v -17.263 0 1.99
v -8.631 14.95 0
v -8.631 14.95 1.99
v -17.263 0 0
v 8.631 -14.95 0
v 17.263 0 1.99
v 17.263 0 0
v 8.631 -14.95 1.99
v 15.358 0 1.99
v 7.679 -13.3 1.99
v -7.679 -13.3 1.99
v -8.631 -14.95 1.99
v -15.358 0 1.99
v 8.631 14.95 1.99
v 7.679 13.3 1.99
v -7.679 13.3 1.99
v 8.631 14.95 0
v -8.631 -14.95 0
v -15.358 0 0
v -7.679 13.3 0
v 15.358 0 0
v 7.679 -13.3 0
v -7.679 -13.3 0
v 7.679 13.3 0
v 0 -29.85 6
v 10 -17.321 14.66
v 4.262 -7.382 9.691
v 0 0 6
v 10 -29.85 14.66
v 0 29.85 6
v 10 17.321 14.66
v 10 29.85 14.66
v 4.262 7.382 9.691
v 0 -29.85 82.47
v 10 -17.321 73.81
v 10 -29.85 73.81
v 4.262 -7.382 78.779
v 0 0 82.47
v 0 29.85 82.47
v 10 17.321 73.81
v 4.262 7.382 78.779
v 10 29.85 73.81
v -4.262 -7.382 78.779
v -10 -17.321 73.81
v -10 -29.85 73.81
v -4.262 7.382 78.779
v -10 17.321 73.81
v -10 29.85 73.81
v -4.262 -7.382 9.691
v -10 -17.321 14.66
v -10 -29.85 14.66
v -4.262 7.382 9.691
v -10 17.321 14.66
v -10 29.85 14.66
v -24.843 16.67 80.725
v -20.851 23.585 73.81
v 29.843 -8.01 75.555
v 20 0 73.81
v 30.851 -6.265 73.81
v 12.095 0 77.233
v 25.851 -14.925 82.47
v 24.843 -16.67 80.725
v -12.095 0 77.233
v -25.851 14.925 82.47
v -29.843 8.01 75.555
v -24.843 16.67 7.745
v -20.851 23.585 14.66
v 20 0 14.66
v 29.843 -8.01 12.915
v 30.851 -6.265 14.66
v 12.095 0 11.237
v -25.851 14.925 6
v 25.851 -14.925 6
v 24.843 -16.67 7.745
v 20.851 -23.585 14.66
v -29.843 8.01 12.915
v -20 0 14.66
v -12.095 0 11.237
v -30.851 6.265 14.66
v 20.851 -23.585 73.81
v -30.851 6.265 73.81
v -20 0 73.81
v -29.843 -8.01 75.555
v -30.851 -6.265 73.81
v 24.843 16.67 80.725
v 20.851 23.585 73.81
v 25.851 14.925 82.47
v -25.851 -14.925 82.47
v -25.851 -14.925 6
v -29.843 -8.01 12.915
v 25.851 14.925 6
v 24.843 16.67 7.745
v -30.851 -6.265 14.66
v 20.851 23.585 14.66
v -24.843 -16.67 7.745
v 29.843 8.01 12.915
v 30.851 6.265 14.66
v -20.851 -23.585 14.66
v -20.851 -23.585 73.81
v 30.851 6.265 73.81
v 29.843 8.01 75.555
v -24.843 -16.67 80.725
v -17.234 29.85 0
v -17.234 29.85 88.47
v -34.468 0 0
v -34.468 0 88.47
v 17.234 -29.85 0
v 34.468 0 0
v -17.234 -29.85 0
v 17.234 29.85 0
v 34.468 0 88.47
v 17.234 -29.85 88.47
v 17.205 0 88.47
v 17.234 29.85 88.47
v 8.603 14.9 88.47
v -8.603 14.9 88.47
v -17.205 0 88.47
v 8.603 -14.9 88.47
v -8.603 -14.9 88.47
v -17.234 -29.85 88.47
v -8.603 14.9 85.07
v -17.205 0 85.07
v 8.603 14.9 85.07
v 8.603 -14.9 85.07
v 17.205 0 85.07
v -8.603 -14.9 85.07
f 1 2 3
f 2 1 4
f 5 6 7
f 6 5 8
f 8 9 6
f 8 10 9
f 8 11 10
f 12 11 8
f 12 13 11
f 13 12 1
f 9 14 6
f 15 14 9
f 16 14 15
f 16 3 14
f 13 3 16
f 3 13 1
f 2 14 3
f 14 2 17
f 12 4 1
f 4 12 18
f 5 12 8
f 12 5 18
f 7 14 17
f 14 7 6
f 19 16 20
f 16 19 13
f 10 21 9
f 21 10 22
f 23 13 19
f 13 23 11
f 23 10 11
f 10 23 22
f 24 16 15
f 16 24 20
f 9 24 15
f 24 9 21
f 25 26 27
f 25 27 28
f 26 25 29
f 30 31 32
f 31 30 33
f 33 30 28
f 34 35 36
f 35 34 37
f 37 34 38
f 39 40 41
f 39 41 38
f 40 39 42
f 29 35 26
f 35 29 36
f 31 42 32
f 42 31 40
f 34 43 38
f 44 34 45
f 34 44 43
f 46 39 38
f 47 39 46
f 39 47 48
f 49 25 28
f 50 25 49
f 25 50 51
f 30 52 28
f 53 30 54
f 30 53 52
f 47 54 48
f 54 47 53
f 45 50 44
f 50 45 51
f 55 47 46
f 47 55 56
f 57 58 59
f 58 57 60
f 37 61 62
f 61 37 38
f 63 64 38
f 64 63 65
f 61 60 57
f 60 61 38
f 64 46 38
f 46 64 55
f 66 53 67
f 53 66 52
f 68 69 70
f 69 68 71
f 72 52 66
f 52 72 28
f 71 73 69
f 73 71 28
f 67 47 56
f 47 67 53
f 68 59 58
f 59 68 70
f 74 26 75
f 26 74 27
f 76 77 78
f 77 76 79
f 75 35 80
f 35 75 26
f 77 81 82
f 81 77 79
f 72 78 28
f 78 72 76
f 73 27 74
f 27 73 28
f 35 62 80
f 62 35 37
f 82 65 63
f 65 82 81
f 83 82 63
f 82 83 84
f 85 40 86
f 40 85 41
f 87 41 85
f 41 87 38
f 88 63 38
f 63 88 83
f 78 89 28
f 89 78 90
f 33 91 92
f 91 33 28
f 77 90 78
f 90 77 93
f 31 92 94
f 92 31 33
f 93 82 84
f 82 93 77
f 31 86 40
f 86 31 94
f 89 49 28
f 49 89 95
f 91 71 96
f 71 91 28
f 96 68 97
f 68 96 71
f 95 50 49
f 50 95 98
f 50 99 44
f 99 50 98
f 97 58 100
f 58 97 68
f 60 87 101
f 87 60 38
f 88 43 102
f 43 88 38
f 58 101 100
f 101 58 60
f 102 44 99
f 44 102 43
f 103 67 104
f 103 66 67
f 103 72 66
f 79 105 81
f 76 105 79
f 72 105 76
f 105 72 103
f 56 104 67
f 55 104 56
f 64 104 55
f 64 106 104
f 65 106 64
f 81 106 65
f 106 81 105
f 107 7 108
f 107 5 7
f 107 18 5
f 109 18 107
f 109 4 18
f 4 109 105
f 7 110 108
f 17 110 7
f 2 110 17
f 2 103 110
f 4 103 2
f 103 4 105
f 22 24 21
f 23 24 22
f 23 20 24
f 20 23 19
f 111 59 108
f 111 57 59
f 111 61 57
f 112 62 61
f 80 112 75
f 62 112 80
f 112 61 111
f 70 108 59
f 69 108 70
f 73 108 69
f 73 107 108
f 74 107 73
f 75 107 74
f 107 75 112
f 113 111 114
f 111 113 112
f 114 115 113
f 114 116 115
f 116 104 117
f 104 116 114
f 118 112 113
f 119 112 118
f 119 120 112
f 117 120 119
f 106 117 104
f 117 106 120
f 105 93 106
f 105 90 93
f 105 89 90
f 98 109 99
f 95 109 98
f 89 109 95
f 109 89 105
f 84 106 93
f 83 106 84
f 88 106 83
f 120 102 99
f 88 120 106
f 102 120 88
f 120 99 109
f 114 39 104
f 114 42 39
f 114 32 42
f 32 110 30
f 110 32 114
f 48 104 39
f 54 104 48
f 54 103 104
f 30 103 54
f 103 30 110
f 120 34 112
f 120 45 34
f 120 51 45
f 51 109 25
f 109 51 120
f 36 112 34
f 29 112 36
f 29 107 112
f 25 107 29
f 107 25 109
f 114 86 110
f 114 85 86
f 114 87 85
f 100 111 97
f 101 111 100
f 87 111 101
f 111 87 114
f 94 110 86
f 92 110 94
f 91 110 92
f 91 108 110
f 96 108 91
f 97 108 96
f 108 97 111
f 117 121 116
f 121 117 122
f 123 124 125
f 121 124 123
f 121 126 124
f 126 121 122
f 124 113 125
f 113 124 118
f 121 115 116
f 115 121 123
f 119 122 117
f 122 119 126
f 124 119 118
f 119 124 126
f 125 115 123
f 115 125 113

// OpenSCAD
// file: ../marble_game.scad
/*
  Konstanten und Funktionen, die zu dem Murmelspiel gehören,
  also fix, bzw. durch die Geometrie des Spiels vorgegeben sind.
  Ist gedacht um über include <marble_game.scad> eingebunden zu werden.
*/

D_Kugel   = 12.8; // mm
D_Rinne   = 13.8; // mm
h_Rinne   = 5.9;  // Rinnentiefe in mm

//s_Hexagon = 2 * sqrt(60^2 - 30^2);// = 103.92 Hexagon vertikale Wiederholung
h_Hexagon_innen  = 29.8; // Schlüsselweite
r_Hexagon_innen = h_Hexagon_innen/2 * 2 / sqrt(3); // Umkreisradius

h_Hexagon_aussen = 59.7;
r_Hexagon_aussen = h_Hexagon_aussen/2 * 2 / sqrt(3); // Umkreisradius

module hexagon (h = 10, s = 59.7)
{
  r = s / 2 / cos (30);
  linear_extrude (height = h)
    polygon ([
      for (phi = [0:60:360])
         [r*cos(phi), r*sin(phi)]]);
}

module beveled_hexagon (h = 10, s = 59.7, b = 3)
{
  difference ()
  {
    r = s / 2 / cos (30);
    hexagon (h = h, s = s);
    for (k = [0:5])
    rotate ([0, 0, k * 60])
     translate ([r-b, -s/4, -s/8])
       cube (s/2);
  }
}

module rail_stamp(rinne_offset = 0.01, y_cyl_offset = 2.0)
{
// Design so, dass 0,0,0 die Mitte der Rinne,
// Außenkante Sechseck, Oberfläche ist.
// Mit rinne_offset kann der Zylinder für die Rinne
// über das Minimum hinaus verlängert werden

noff = 1;  // auch ein Offset, allerdings wird der nach hinten freigeschnitten (für moderate Neigungen)

// Die zwei Ausbuchtungen recht und links
D_bogen  = 3.6;   // Oberer Bogen
s_rand   = 1.2;   // Abstand zur Außenkante
h_tasche = 5.1;   // Höhe der Tasche
t_tasche = 9.1;   // Tiefe der Tasche zur Oberfläche
t_rand   = 7.3;   // Tiefe des Absatzes (der s_rand breite Steg) 
x_tasche = 6.5/2; // Abstand Tasche linke Seite zur Symmetrielinie

for (k = [-1:2:1])
{
  translate([k* (x_tasche + D_bogen/2), h_tasche + s_rand, -t_tasche])
    cylinder (t_tasche, d = D_bogen);

  cube_x = k * x_tasche - ((k < 0)? D_bogen : 0);
  translate([cube_x, s_rand, -t_tasche])
    cube([D_bogen, h_tasche, t_tasche]);

  translate([cube_x, +0.01 - noff, -t_rand])
    cube ([D_bogen, s_rand + noff, t_rand]);
}
translate ([0, -noff, D_Rinne/2 - h_Rinne]) // Oberfläche bei z = 0
  rotate ([-90, 0, 0])
    {
      hull ()
      {  
          cylinder (h = 10 + rinne_offset + noff, d = D_Rinne);
          translate ([0, -y_cyl_offset, 0])
            cylinder (h = 10 + rinne_offset + noff, d = D_Rinne);
      }
    }
}

module demo_rail_stamp ()
{
    difference ()
    {
      hexagon (h = 10, s = 60);

    translate ([0, 0, 1.6])
      hexagon (h = 10, s = 40); // grob innen

    for (k = [0:2])
      rotate ([0, 0, 120 * k])
        translate ([0, -30, 10])
          rail_stamp (rinne_offset = 40);
    }    
}

module base_adapter (t = 1.0)
{
    // Adapter zur Grundplatte, 2mm stark
    difference ()
    {
      beveled_hexagon(h = 4, s = h_Hexagon_innen, b = 1.2);
      translate ([0, 0, -0.01])
        beveled_hexagon(h = 4.02, s = h_Hexagon_innen - 2*t, b = 1.2);
      for (k = [0:5])
        rotate ([0, 0, 60 * k])
          translate ([r_Hexagon_innen - 0.6, 0, 2])
            cylinder (d = 6, h = 5);
    }
}

module base_adapter_inv (t = 1.3)
{
  translate ([0, 0, -0.01])
    difference ()
    {
      hexagon(h = 2, s = h_Hexagon_innen + 0.1);
      translate ([0, 0, -0.01])
        hexagon(h = 2.02, s = h_Hexagon_innen - 2*t);
    }
}
// main file
include <../marble_game.scad>

n = 9;
h_Hex = 9.83 * n;
w_cut = 20;

difference ()
{
  hexagon (h = h_Hex, s = h_Hexagon_aussen);
  base_adapter_inv (t = 1.6);
  translate ([0, 0, h_Hex - 3.4])
    hexagon (h = 3.5, s = h_Hexagon_innen);

  for (k = [0:2])
    rotate ([0, 0, k * 60])
      rotate ([90, 0, 0])
      linear_extrude (h = 70, center = true)
        {
          x = w_cut/2;
          ys = 6;
          y = x * sin(60);
          polygon([[0, ys],
                   [x, ys + y],
                   [x, h_Hex - ys - y],
                   [0, h_Hex - ys],
                   [-x, h_Hex - ys - y],
                   [-x, ys + y],
                   [0, ys]]);
        }    
}  
